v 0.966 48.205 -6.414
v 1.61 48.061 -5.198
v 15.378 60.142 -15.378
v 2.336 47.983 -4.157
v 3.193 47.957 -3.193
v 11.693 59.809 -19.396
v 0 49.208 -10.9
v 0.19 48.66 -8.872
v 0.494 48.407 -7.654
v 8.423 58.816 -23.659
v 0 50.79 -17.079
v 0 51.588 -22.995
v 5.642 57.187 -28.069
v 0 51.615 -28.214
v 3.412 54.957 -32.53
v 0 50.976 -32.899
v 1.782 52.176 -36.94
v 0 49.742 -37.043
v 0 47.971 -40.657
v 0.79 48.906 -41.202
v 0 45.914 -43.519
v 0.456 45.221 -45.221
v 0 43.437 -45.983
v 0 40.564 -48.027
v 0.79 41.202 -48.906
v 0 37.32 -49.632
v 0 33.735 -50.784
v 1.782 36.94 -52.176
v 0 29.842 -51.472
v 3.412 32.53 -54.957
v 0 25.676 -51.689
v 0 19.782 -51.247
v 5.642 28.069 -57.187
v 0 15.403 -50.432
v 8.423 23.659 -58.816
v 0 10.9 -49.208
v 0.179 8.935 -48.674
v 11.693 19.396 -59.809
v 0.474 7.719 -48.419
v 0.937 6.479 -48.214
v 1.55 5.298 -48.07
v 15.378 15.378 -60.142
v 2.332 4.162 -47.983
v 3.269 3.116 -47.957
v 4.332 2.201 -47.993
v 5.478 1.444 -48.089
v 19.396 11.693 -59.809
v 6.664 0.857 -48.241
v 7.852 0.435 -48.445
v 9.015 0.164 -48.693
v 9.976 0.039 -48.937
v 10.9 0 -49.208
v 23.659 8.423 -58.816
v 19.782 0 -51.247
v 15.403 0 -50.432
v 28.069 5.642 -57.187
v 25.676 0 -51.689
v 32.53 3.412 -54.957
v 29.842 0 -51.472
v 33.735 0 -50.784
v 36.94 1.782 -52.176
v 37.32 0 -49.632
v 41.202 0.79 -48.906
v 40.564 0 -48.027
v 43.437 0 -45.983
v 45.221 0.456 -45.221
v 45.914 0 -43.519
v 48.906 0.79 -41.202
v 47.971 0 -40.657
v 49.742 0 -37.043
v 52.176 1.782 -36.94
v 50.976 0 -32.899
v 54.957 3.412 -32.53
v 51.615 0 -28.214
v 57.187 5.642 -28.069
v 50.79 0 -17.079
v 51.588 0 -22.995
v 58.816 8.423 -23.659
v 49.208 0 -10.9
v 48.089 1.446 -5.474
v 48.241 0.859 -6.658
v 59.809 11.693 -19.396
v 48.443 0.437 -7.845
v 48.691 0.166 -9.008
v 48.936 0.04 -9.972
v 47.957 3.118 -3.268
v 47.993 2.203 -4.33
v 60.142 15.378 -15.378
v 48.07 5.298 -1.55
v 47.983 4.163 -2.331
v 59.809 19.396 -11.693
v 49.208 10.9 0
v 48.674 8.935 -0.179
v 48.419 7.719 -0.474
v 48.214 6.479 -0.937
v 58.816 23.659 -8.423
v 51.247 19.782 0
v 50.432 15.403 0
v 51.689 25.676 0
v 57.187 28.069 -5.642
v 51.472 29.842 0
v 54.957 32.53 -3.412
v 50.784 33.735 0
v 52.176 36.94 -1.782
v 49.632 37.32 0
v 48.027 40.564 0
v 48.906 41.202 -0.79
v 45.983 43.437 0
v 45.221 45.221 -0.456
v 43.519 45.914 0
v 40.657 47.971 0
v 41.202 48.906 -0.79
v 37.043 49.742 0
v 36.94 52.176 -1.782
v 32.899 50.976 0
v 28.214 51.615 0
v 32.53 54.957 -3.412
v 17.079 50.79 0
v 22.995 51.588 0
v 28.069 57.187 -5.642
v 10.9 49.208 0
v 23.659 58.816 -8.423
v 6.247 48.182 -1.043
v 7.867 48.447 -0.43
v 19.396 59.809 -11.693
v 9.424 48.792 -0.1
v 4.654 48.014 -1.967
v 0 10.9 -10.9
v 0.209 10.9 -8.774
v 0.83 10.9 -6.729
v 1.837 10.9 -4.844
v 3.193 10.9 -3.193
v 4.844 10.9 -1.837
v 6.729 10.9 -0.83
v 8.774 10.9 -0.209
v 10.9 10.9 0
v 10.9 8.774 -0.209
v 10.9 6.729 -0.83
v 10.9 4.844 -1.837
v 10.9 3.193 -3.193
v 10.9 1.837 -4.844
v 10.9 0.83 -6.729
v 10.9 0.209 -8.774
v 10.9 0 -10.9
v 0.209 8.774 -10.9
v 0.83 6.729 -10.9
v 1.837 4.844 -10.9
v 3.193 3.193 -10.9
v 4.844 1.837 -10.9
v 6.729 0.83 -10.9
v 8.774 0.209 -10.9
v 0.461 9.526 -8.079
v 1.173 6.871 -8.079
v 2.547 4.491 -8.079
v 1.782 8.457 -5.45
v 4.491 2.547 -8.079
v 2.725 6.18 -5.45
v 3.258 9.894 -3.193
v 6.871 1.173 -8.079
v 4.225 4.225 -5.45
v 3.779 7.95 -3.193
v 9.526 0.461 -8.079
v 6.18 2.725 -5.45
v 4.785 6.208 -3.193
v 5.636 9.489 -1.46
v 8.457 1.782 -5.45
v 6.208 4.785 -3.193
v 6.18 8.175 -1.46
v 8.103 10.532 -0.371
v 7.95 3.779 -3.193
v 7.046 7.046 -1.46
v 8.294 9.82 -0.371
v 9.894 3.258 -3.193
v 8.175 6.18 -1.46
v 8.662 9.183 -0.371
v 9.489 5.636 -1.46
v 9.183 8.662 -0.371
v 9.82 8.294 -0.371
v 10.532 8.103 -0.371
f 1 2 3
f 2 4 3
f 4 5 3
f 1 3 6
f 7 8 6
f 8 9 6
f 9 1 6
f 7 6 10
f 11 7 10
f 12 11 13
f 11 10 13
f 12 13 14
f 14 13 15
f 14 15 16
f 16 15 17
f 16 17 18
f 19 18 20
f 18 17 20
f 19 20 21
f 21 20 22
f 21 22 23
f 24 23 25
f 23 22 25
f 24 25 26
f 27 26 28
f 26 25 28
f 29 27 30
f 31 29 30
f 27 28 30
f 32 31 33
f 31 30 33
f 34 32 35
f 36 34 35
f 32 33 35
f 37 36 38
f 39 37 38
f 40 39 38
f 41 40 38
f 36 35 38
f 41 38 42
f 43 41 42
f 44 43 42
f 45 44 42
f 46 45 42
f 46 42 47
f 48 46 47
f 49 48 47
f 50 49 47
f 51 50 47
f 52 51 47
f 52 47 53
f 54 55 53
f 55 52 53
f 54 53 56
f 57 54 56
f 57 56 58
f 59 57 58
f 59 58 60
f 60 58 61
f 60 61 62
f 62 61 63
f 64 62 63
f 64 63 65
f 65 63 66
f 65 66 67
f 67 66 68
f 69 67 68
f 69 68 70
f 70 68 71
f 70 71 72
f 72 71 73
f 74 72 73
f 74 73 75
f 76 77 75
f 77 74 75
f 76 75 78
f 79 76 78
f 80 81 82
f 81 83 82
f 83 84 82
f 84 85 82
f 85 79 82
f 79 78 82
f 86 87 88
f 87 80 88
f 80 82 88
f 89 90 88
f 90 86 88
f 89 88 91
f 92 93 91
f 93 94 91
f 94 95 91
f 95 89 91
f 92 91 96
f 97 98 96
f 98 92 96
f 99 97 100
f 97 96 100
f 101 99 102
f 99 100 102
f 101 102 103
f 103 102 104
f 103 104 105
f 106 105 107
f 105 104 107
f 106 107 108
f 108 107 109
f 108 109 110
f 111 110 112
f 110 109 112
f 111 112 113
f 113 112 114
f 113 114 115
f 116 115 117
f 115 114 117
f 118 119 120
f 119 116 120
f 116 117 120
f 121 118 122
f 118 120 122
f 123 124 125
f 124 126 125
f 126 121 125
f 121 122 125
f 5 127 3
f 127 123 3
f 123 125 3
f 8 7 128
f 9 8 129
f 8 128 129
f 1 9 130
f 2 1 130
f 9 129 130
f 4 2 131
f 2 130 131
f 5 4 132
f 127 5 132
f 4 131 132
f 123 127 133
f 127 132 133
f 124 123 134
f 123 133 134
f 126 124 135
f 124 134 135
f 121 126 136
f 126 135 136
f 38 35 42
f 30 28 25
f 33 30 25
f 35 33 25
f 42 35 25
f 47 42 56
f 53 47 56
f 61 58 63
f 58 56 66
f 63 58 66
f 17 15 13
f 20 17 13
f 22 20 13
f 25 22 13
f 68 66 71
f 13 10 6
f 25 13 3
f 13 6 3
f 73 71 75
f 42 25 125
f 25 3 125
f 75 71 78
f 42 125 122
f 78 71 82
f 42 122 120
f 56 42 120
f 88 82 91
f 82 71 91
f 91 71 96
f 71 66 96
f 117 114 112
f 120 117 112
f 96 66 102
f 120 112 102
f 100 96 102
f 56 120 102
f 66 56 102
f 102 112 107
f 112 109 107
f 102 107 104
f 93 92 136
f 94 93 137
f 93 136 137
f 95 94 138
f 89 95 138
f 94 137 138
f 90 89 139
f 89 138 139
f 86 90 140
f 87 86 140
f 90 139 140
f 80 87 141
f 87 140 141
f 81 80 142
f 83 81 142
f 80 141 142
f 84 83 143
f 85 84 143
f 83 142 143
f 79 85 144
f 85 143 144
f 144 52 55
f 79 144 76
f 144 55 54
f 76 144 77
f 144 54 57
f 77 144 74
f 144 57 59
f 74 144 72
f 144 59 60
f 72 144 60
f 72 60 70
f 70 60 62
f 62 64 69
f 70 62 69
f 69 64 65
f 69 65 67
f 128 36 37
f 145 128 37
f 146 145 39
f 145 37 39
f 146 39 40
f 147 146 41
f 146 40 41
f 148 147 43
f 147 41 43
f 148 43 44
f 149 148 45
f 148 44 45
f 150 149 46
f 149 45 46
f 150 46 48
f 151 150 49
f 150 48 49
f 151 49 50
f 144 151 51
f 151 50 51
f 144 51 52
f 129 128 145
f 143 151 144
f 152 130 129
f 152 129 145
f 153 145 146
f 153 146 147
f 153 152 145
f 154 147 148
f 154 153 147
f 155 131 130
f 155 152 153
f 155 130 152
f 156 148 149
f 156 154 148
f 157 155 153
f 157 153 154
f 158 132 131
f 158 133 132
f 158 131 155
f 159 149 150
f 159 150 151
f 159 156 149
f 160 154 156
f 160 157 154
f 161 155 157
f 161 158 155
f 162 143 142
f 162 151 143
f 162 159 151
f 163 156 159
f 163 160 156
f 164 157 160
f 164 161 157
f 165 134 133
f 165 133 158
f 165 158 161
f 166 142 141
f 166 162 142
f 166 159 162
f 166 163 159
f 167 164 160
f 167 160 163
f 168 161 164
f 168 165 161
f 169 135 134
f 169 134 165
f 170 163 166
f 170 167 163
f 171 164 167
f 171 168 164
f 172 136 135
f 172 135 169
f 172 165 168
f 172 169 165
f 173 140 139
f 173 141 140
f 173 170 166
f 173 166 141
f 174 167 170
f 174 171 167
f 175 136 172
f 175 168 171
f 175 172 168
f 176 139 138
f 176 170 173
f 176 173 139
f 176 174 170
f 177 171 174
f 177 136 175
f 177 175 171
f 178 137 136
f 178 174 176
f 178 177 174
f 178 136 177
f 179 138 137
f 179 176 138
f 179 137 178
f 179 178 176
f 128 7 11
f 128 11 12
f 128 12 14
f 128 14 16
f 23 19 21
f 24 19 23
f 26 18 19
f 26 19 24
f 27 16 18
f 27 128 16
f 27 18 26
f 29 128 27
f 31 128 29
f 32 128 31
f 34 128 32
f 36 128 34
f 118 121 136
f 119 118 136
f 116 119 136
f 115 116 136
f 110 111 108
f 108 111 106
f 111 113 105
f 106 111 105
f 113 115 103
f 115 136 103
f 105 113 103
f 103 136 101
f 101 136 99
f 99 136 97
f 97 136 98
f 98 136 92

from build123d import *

# Parameters (mm, degrees)
SKETCH1_W          = 60.6
SKETCH1_H          = 60.6
EXTRUDE1_DEPTH     = 60.6
CUT_EXTRUDE2_DEPTH = 53.482278939
SKETCH3_R          = 36.55
CUT_EXTRUDE1_DEPTH = 53.482278939
FILLET1_R          = 10.9


with BuildPart() as part:
    # Sketch1 → Extrude1 (new body)
    with BuildSketch(Plane(origin=(0, 0, 0), x_dir=(1, 0, 0), z_dir=(0, 1, 0))):
        with Locations((30.3, 30.3)):
            Rectangle(SKETCH1_W, SKETCH1_H)
    extrude(amount=EXTRUDE1_DEPTH)

    # Sketch4 → Cut-Extrude2 (cut, through all)
    with BuildSketch(Plane(origin=(30.299342127, 30.299342127, -30.299342127), x_dir=(0.8164965809277261, -0.4082482904638631, 0.4082482904638628), z_dir=(-0.5773502691896256, -0.577350269189626, 0.5773502691896256))):
        Polygon((-49.479692804, 0), (-24.739846402, -42.85067094), (24.739846402, -42.85067094), (49.479692804, 0), (24.739846402, 42.85067094), (-24.739846402, 42.85067094), align=None)
    extrude(amount=-CUT_EXTRUDE2_DEPTH, mode=Mode.SUBTRACT)

    # Sketch3 → Cut-Extrude1 (cut, through all)
    with BuildSketch(Plane(origin=(30.299342127, 30.299342127, -30.299342127), x_dir=(0.8164965809277261, -0.4082482904638631, 0.4082482904638628), z_dir=(-0.5773502691896256, -0.577350269189626, 0.5773502691896256))):
        Polygon((-37.108963877, 21.426731029), (-24.739846402, 42.85067094), (-0.001611453, 42.85067094), (37.11057533, 21.423939911), (49.479692804, 0), (37.11057533, -21.423939911), (-0.001611453, -42.85067094), (-24.739846402, -42.85067094), (-37.108963877, -21.426731029), align=None)
        with Locations(Location((0, 0, 0), (0, 0, 120))):
            Circle(SKETCH3_R, mode=Mode.SUBTRACT)
    extrude(amount=CUT_EXTRUDE1_DEPTH, mode=Mode.SUBTRACT)

    # Fillet1
    # the kernel refuses this fillet: 10.9 mm, written as the material it takes off along each edge
    with BuildSketch(Plane(origin=(10.9, 10.9, -10.9), x_dir=(0, -1, 0), z_dir=(0, 0, 1))) as fillet1_piece_1_section:
        Polygon((0, 0), (FILLET1_R, 0), (FILLET1_R, -FILLET1_R), (0, -FILLET1_R), align=None)
    fillet1_piece_1 = extrude(amount=FILLET1_R, mode=Mode.PRIVATE)
    fillet1_piece_1 = fillet1_piece_1 - Plane(origin=(10.9, 10.9, -10.9), x_dir=(0.7071067811865475, 0.7071067811865475, 0), z_dir=(0, 0, 1)) * Sphere(FILLET1_R, mode=Mode.PRIVATE)
    add(fillet1_piece_1, mode=Mode.SUBTRACT)
    with BuildSketch(Plane(origin=(0, 0, -72.014425049), x_dir=(1, 0, 0), z_dir=(0, 0, 1)), Plane(origin=(0, 10.9, 0), x_dir=(1, 0, 0), z_dir=(0, 1, 0))) as fillet1_piece_2:
        with BuildLine():
            CenterArc((FILLET1_R, FILLET1_R), FILLET1_R, 180, 90)
            Line((0, FILLET1_R), (0, 0))
            Line((0, 0), (FILLET1_R, 0))
        make_face()
    extrude(amount=61.114425049, mode=Mode.SUBTRACT)
    with BuildSketch(Plane(origin=(10.9, 0, 0), x_dir=(0, 1, 0), z_dir=(1, 0, 0))) as fillet1_piece_3:
        with BuildLine():
            CenterArc((FILLET1_R, -FILLET1_R), FILLET1_R, 90, 90)
            Line((0, -FILLET1_R), (0, 0))
            Line((0, 0), (FILLET1_R, 0))
        make_face()
    extrude(amount=61.114425049, mode=Mode.SUBTRACT)


solid = part.part
